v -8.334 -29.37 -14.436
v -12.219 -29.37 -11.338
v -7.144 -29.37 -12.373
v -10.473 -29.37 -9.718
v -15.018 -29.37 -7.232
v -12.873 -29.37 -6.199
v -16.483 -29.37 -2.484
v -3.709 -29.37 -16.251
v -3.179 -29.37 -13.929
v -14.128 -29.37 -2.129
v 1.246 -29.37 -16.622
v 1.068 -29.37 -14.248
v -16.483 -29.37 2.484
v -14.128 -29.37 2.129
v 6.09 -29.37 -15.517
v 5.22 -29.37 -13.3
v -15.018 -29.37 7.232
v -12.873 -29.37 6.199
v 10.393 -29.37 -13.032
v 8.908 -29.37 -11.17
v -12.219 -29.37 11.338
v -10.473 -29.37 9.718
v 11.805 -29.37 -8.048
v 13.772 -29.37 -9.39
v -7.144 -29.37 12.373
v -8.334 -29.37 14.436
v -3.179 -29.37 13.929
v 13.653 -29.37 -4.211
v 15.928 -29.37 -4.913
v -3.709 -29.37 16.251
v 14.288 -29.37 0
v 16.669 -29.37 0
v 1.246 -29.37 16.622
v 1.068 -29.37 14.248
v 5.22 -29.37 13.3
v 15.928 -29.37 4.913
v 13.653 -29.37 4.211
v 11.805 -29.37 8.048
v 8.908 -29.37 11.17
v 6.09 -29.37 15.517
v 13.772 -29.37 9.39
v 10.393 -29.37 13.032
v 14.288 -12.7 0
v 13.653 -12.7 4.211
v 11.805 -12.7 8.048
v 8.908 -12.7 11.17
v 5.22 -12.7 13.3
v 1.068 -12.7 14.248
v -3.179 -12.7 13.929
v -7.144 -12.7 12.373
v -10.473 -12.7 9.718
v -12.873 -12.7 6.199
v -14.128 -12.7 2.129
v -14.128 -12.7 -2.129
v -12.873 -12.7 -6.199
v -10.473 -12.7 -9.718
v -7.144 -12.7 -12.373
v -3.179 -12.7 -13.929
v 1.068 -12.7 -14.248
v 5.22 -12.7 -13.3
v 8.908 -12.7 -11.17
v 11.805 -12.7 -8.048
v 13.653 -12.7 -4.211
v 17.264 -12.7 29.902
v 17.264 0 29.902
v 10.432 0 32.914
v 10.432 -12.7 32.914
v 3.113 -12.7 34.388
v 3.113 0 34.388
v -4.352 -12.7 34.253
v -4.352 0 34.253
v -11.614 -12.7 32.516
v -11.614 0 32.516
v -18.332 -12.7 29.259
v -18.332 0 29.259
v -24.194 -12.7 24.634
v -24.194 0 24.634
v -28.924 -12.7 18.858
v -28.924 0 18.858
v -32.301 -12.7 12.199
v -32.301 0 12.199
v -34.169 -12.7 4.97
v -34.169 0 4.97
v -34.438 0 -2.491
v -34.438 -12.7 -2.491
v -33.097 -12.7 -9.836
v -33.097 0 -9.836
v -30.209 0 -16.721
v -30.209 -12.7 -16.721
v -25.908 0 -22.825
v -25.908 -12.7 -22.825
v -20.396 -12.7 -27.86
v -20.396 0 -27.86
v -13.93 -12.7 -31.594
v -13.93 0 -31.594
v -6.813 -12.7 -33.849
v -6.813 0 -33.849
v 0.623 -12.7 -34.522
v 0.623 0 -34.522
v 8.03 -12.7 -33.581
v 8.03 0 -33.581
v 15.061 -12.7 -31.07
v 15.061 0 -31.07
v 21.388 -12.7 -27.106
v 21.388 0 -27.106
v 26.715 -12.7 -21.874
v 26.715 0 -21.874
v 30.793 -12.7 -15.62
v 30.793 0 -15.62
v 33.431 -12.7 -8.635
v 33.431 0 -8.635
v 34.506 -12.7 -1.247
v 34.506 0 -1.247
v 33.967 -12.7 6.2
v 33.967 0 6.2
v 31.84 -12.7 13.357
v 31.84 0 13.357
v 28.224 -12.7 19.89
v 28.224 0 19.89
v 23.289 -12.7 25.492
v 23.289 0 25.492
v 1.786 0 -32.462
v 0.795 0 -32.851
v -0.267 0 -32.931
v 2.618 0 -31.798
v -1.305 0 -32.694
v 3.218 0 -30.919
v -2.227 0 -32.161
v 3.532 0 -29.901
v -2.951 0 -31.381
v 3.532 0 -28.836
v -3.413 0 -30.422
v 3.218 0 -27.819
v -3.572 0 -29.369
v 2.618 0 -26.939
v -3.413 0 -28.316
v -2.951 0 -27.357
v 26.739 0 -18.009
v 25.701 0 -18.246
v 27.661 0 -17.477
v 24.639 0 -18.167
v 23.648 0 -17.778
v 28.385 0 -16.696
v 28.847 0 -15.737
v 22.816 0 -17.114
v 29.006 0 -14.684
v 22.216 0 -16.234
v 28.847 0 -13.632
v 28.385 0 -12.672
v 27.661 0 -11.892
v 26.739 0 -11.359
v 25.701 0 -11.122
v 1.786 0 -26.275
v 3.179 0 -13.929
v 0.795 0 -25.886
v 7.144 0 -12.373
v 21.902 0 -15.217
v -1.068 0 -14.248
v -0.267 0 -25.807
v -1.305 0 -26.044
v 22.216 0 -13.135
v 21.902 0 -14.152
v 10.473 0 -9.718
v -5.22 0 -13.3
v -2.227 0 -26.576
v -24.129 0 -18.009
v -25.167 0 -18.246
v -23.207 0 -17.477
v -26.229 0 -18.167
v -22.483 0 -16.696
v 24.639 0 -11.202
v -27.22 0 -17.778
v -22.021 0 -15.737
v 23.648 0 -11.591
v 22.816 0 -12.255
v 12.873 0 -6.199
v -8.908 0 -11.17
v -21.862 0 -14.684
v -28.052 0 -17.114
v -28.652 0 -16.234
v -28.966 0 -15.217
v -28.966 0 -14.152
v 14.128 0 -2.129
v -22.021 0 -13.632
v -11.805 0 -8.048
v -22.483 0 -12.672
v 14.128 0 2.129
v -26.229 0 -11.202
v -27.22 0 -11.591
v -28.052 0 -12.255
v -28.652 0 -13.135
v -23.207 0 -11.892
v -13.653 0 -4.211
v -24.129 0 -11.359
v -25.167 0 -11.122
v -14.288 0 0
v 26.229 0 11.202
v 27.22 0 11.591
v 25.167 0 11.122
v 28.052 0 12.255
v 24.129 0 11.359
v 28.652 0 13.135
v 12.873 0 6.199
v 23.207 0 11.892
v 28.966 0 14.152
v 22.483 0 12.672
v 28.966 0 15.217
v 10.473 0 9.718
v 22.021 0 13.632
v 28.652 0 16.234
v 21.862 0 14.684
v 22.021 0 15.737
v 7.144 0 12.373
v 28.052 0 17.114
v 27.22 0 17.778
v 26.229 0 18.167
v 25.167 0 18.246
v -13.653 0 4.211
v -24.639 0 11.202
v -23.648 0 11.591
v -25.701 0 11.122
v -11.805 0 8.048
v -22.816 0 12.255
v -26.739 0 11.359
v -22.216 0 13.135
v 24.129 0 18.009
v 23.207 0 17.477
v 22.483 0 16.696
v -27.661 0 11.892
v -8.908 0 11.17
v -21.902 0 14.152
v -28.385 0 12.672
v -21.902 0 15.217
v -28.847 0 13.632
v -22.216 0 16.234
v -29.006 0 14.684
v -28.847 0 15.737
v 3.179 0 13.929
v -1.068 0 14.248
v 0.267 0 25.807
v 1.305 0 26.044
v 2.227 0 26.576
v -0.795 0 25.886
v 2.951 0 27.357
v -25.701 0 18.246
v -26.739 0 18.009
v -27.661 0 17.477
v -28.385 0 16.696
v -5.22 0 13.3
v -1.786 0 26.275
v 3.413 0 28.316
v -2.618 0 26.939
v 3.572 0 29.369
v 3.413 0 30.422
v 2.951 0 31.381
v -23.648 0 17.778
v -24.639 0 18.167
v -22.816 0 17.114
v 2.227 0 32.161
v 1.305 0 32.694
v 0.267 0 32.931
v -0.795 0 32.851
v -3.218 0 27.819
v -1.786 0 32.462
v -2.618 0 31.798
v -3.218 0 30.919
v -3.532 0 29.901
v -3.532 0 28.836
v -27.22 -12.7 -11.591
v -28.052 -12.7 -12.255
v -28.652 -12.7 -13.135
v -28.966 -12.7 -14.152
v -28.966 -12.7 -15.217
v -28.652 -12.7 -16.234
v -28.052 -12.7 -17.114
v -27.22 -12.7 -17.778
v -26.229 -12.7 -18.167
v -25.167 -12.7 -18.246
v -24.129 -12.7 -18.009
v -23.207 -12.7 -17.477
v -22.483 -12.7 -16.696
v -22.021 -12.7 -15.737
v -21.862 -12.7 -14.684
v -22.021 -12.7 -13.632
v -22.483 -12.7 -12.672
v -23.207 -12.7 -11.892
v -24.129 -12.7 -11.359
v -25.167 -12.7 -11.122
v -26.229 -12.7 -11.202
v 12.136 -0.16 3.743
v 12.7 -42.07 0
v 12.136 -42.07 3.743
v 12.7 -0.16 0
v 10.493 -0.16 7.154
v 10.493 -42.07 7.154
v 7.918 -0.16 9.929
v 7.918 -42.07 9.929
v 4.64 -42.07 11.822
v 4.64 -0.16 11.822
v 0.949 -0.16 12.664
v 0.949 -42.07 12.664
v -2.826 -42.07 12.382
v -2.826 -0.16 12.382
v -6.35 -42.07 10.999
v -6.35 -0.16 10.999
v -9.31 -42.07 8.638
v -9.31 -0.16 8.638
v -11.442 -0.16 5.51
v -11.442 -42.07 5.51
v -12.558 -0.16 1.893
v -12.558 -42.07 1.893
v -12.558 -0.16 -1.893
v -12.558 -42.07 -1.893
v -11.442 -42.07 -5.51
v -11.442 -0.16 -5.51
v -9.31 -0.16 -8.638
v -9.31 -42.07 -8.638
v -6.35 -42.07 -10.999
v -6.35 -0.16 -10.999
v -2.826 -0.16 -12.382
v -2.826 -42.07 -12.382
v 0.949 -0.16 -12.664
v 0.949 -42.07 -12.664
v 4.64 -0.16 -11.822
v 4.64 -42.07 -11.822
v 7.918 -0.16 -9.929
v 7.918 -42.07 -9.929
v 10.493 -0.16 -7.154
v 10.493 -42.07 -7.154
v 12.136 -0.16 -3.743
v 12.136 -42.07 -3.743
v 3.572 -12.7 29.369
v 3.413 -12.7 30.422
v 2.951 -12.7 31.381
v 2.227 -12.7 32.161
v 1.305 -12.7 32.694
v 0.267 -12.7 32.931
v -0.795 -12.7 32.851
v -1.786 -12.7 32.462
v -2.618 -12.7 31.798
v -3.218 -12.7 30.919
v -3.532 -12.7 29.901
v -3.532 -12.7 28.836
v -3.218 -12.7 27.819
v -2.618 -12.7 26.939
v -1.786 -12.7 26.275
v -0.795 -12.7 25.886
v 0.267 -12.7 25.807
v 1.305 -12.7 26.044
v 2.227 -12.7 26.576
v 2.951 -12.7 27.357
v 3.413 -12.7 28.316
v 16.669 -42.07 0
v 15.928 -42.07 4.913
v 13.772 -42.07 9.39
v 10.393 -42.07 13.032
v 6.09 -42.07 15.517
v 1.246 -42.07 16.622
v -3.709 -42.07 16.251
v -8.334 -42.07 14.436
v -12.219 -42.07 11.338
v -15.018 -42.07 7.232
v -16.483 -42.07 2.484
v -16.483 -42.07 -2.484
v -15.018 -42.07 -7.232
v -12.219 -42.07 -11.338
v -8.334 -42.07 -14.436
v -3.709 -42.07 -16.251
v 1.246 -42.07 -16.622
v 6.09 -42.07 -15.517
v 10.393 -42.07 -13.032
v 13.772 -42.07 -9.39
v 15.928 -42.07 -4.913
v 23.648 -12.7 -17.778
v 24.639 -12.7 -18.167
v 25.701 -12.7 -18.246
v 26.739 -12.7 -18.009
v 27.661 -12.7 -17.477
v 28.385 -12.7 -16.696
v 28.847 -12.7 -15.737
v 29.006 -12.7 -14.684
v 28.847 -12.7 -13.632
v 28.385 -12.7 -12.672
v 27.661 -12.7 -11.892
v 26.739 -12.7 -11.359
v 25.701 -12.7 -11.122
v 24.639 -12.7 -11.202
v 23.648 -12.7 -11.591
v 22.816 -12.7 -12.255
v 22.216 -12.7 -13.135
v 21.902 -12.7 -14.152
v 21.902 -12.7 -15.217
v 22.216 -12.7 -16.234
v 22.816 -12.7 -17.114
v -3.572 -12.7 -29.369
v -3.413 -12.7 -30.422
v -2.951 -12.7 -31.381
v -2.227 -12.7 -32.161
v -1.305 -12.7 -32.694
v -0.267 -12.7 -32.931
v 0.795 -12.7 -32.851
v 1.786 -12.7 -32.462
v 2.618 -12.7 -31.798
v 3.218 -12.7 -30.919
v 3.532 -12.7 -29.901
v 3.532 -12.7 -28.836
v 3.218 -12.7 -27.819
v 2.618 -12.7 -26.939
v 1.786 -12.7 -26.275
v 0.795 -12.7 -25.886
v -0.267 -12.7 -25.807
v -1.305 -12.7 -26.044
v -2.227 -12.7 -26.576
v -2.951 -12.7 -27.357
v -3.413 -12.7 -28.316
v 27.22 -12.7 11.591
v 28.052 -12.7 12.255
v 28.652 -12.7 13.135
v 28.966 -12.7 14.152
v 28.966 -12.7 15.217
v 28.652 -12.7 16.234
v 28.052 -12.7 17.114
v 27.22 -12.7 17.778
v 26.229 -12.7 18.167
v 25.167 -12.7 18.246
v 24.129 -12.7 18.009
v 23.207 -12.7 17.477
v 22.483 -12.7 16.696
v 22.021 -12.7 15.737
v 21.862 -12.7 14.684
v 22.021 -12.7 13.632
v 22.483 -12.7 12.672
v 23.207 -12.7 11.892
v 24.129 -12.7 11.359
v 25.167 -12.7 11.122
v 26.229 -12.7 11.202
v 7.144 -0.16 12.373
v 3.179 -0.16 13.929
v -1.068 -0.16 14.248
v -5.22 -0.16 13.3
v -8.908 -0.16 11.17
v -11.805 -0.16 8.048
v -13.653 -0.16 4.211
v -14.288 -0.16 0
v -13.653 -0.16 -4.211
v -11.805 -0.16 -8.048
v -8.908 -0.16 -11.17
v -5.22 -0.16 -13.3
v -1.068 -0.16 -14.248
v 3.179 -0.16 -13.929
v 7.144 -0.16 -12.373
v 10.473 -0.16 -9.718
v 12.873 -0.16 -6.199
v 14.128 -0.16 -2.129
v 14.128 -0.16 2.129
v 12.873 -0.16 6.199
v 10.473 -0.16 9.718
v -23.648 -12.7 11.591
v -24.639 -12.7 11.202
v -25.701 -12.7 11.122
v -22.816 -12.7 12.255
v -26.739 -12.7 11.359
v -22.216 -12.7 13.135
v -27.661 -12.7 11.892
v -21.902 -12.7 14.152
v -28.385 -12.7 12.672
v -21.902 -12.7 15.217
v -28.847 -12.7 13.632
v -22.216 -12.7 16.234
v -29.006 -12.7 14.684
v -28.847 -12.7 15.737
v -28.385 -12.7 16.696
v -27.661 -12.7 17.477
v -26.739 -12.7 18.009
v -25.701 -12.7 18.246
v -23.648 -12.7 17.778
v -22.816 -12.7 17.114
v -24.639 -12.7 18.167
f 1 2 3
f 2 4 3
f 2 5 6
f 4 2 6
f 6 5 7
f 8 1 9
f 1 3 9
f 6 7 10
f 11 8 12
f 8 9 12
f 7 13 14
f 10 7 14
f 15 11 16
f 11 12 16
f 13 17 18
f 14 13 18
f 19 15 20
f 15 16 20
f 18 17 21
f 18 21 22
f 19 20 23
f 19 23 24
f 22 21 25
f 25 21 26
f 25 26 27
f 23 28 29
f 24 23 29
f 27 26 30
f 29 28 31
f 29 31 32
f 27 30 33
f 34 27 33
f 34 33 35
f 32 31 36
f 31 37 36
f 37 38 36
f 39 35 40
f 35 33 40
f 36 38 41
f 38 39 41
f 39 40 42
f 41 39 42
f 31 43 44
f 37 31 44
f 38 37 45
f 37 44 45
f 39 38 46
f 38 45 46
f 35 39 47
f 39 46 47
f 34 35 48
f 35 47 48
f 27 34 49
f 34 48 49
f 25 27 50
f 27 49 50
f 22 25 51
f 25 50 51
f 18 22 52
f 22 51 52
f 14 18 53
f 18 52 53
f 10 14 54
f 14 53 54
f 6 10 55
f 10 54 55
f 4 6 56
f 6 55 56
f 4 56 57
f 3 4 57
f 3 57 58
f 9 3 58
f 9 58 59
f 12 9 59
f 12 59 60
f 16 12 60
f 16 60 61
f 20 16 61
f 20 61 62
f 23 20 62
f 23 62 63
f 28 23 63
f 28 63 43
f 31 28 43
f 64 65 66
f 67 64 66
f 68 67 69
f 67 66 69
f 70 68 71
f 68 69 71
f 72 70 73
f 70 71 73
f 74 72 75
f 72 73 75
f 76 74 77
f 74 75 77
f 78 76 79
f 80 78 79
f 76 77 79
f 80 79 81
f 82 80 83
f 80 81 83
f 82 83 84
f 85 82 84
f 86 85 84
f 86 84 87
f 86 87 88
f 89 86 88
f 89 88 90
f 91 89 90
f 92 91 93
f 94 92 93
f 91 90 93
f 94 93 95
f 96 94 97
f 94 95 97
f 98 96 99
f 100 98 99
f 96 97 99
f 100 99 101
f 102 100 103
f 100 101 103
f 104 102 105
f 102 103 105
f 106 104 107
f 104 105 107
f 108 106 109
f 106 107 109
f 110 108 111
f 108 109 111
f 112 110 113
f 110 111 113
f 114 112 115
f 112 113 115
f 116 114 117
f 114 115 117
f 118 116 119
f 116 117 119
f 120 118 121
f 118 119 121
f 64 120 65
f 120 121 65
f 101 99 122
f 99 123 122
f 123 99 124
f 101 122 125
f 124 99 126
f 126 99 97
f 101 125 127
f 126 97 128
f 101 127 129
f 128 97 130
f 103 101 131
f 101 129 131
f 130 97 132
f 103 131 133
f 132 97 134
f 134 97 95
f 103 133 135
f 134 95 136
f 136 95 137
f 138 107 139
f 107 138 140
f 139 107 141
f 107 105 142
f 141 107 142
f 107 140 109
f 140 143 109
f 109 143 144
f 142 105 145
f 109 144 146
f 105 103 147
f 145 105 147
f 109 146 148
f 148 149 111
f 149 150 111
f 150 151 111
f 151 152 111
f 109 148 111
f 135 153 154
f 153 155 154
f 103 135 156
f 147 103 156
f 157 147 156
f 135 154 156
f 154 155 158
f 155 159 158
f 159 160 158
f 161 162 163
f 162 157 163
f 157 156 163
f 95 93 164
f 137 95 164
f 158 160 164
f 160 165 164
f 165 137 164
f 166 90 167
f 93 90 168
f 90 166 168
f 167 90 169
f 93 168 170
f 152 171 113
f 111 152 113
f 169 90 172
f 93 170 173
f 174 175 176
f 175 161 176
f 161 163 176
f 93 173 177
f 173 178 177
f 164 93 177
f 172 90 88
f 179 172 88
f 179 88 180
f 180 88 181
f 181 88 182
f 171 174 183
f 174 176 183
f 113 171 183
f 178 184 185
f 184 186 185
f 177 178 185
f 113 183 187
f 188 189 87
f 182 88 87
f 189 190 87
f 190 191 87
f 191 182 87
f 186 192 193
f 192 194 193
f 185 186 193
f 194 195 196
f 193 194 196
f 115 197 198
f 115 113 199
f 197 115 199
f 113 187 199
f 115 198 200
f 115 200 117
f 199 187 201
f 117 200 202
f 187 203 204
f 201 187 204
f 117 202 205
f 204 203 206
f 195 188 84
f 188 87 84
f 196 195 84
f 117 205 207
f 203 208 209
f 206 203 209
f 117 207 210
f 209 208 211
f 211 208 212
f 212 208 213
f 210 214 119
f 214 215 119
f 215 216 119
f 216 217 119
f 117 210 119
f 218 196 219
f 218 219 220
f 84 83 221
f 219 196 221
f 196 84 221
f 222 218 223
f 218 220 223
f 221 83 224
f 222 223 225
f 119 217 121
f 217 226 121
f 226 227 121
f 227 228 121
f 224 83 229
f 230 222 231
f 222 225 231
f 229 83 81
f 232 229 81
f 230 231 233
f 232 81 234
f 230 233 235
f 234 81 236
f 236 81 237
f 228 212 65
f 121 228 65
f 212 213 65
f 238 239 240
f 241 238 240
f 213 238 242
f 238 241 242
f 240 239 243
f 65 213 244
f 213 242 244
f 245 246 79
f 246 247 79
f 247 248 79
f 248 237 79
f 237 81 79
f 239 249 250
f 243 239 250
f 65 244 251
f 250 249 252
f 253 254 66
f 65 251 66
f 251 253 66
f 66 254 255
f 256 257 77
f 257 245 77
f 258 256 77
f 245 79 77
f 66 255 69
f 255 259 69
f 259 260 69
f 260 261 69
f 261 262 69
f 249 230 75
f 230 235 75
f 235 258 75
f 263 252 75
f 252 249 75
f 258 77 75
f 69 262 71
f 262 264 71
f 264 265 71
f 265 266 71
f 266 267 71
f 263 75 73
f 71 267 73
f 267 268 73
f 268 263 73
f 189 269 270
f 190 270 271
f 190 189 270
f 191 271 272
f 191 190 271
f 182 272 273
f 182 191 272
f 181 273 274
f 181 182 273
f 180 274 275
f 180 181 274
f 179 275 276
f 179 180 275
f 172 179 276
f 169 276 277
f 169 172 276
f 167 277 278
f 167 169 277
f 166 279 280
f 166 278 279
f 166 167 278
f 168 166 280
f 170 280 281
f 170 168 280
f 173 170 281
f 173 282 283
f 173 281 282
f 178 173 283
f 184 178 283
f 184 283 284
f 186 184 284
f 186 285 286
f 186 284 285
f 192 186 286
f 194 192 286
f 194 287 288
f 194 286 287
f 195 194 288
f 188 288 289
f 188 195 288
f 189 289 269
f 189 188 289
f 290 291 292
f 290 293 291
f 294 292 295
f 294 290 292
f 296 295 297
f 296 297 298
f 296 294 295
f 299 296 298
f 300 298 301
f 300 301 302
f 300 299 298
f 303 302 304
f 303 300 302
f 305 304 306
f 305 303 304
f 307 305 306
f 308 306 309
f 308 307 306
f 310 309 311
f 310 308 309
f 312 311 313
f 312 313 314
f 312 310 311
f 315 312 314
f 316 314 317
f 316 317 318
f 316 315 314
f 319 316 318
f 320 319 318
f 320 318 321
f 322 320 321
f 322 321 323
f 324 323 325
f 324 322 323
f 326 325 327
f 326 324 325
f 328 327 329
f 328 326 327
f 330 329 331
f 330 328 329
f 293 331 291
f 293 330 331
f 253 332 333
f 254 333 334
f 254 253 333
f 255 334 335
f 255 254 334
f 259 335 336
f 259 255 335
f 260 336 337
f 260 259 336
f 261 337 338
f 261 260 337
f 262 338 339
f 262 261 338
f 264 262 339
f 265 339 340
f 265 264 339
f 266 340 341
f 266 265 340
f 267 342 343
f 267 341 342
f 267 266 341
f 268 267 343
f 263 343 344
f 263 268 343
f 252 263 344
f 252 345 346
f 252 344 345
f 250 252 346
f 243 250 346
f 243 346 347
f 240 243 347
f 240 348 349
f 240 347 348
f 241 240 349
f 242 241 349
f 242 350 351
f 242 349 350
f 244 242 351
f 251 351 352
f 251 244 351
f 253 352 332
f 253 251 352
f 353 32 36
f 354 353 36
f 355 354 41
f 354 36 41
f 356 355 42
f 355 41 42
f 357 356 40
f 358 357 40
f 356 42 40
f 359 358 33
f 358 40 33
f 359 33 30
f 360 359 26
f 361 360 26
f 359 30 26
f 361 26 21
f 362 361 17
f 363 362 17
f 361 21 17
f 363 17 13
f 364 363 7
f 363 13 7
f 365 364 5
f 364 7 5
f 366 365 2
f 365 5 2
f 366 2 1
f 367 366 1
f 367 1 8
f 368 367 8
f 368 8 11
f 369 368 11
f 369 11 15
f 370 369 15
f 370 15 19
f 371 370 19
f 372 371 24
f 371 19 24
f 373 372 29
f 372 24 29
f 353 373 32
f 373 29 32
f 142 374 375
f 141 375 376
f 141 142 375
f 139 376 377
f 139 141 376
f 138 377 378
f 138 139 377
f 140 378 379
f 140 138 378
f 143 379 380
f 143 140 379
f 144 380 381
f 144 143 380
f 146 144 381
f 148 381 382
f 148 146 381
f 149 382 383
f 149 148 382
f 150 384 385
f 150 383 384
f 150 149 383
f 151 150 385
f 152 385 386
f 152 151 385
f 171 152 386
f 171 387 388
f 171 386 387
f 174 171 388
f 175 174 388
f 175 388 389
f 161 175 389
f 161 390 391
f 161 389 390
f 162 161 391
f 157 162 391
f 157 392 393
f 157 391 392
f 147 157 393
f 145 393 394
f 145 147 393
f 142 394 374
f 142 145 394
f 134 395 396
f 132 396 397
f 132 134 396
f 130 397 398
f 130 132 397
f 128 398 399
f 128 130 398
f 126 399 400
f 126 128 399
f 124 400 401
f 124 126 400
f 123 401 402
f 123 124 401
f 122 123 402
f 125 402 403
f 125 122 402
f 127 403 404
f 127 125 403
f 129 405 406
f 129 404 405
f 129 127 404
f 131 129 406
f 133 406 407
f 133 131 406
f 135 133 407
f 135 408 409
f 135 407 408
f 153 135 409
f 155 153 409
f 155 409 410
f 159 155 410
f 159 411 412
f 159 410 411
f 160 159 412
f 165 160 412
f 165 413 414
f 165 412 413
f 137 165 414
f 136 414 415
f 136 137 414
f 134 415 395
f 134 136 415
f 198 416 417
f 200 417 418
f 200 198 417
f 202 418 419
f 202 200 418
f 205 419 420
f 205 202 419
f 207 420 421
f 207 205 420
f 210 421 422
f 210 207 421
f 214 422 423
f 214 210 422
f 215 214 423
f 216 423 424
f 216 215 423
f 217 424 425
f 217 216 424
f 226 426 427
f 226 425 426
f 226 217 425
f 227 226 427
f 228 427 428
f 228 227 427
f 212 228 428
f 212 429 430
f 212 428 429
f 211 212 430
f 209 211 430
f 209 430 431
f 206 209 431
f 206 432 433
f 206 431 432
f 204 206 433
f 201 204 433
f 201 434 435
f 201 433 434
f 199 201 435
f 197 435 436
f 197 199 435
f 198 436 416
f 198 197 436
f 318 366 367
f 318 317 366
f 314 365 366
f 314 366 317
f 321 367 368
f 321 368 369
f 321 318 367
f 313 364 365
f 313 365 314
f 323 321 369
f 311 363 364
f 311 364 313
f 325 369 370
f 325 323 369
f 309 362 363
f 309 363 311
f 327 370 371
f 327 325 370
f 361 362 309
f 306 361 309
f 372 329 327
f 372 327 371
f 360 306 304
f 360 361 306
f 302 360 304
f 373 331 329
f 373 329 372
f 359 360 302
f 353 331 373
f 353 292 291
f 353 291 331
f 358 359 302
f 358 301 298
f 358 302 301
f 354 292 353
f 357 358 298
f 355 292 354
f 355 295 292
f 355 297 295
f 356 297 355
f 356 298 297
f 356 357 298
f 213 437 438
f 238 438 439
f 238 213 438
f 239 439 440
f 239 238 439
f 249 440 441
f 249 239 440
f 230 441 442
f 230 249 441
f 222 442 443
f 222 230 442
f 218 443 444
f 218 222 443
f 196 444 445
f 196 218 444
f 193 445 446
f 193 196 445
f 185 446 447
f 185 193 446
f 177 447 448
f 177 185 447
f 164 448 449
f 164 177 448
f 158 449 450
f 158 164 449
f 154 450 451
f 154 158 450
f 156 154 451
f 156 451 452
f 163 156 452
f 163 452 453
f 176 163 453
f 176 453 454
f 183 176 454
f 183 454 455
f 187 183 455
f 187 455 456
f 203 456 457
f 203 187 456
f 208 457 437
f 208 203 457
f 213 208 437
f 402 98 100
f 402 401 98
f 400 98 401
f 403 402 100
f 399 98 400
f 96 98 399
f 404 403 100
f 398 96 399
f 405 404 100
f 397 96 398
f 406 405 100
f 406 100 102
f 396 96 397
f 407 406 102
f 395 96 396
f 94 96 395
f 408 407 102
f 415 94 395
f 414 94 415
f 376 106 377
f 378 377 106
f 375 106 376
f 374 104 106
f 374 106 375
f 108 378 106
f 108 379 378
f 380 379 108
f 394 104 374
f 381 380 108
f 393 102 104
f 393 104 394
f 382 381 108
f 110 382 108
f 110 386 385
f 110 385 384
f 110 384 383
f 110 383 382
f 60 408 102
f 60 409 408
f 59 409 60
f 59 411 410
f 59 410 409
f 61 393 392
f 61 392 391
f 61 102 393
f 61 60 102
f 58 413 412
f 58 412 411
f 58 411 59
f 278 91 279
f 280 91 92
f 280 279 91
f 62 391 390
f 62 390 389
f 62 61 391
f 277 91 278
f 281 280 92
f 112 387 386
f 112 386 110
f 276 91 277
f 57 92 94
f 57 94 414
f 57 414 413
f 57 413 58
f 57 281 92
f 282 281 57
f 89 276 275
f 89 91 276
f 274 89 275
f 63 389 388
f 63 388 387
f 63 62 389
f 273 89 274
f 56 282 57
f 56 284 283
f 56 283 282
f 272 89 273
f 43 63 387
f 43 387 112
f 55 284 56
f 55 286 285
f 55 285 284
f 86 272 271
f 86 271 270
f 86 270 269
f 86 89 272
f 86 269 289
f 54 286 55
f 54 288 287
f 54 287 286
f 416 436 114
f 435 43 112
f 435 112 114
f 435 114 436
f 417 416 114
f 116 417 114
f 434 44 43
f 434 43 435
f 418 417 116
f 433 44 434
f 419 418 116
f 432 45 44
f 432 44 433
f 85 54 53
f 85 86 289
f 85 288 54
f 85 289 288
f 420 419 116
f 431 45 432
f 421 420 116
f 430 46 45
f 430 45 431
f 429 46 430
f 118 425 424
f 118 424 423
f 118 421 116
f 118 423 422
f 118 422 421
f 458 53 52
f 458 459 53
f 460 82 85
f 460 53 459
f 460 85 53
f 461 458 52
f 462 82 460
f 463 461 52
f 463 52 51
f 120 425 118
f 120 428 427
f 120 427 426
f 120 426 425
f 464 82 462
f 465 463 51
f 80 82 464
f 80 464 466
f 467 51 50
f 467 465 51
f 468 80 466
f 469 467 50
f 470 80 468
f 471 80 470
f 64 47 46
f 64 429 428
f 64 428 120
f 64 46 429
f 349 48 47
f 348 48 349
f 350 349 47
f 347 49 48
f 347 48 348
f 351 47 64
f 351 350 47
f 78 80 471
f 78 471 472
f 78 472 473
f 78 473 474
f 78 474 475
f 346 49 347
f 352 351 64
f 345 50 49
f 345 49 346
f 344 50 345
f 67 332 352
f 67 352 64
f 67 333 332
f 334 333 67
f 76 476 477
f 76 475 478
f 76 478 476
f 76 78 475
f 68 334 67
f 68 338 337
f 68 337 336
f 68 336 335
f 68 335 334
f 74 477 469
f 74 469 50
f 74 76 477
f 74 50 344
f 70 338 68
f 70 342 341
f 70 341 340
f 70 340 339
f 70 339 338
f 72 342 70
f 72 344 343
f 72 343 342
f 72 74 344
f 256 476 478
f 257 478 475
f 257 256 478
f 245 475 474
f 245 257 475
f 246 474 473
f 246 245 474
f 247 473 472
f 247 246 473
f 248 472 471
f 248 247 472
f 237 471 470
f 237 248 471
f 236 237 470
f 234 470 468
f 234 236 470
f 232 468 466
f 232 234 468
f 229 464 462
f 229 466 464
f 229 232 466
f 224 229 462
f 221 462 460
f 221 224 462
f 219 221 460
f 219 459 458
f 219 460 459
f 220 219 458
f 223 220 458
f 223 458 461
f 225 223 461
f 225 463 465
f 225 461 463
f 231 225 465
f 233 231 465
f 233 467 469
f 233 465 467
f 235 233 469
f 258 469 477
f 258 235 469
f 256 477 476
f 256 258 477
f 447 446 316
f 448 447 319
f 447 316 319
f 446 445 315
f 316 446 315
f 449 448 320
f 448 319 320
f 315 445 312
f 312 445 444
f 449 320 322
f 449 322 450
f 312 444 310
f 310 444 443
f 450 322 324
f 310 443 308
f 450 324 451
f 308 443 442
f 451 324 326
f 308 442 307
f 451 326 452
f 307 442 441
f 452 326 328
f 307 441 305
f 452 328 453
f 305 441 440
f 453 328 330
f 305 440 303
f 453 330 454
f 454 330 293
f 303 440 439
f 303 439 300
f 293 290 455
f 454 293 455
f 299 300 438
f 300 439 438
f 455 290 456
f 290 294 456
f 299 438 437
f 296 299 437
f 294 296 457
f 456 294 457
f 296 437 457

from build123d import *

# Parameters (mm, degrees)
SKETCH039_R            = 14.2875
SKETCH039_R_2          = 12.7
PAD036_DEPTH           = 29.21
SKETCH037_R            = 16.66875
SKETCH037_R_2          = 12.7
PAD041_DEPTH           = 12.7
SKETCH041_R            = 3.571875
PAD038_DEPTH           = 13
SKETCH040_R            = 34.528125
SKETCH040_R_2          = 14.2875
PAD037_DEPTH           = 12.7
CUT028_PLACEMENT_ANGLE = 60
CUT027_PLACEMENT_ANGLE = 60
CUT031_PLACEMENT_ANGLE = 60
CUT032_PLACEMENT_ANGLE = 60
CUT029_PLACEMENT_ANGLE = 60


with BuildPart() as body036:
    # Sketch039 → Pad036 (new body)
    with BuildSketch(Plane.XZ):
        Circle(SKETCH039_R)
        Circle(SKETCH039_R_2, mode=Mode.SUBTRACT)
    extrude(amount=PAD036_DEPTH)


with BuildPart() as body036_1:
    # Body036 placement: moved
    add(body036.part.moved(Location((0, -0.16, 0))))


with BuildPart() as body037:
    # Sketch037 → Pad041 (new body)
    with BuildSketch(Plane.XZ):
        Circle(SKETCH037_R)
        Circle(SKETCH037_R_2, mode=Mode.SUBTRACT)
    extrude(amount=PAD041_DEPTH)


with BuildPart() as body037_1:
    # Body037 placement: moved
    add(body037.part.moved(Location((0, -29.37, 0))))


with BuildPart() as body040:
    # Sketch041 → Pad038 (new body)
    with BuildSketch(Plane.XZ):
        with Locations((0, 29.36875)):
            Circle(SKETCH041_R)
    extrude(amount=PAD038_DEPTH)


with BuildPart() as fusion002:
    # Sketch040 → Pad037 (new body)
    with BuildSketch(Plane.XZ):
        Circle(SKETCH040_R)
        Circle(SKETCH040_R_2, mode=Mode.SUBTRACT)
    extrude(amount=PAD037_DEPTH)

    # Cut028: cut Body040
    add(body040.part, mode=Mode.SUBTRACT)


with BuildPart() as fusion002_1:
    # Cut028 placement: moved
    add(fusion002.part.rotate(Axis((0, 0, 0), (0, 1, 0)), CUT028_PLACEMENT_ANGLE))

    # Cut027: cut Body040
    add(body040.part, mode=Mode.SUBTRACT)


with BuildPart() as fusion002_2:
    # Cut027 placement: moved
    add(fusion002_1.part.rotate(Axis((0, 0, 0), (0, 1, 0)), CUT027_PLACEMENT_ANGLE))

    # Cut031: cut Body040
    add(body040.part, mode=Mode.SUBTRACT)


with BuildPart() as fusion002_3:
    # Cut031 placement: moved
    add(fusion002_2.part.rotate(Axis((0, 0, 0), (0, 1, 0)), CUT031_PLACEMENT_ANGLE))

    # Cut032: cut Body040
    add(body040.part, mode=Mode.SUBTRACT)


with BuildPart() as fusion002_4:
    # Cut032 placement: moved
    add(fusion002_3.part.rotate(Axis((0, 0, 0), (0, 1, 0)), CUT032_PLACEMENT_ANGLE))

    # Cut029: cut Body040
    add(body040.part, mode=Mode.SUBTRACT)


with BuildPart() as fusion002_5:
    # Cut029 placement: moved
    add(fusion002_4.part.rotate(Axis((0, 0, 0), (0, 1, 0)), CUT029_PLACEMENT_ANGLE))

    # Cut030: cut Body040
    add(body040.part, mode=Mode.SUBTRACT)

    # Fusion002: union Body036, Body037
    add(body036_1.part)
    add(body037_1.part)


solid = fusion002_5.part
